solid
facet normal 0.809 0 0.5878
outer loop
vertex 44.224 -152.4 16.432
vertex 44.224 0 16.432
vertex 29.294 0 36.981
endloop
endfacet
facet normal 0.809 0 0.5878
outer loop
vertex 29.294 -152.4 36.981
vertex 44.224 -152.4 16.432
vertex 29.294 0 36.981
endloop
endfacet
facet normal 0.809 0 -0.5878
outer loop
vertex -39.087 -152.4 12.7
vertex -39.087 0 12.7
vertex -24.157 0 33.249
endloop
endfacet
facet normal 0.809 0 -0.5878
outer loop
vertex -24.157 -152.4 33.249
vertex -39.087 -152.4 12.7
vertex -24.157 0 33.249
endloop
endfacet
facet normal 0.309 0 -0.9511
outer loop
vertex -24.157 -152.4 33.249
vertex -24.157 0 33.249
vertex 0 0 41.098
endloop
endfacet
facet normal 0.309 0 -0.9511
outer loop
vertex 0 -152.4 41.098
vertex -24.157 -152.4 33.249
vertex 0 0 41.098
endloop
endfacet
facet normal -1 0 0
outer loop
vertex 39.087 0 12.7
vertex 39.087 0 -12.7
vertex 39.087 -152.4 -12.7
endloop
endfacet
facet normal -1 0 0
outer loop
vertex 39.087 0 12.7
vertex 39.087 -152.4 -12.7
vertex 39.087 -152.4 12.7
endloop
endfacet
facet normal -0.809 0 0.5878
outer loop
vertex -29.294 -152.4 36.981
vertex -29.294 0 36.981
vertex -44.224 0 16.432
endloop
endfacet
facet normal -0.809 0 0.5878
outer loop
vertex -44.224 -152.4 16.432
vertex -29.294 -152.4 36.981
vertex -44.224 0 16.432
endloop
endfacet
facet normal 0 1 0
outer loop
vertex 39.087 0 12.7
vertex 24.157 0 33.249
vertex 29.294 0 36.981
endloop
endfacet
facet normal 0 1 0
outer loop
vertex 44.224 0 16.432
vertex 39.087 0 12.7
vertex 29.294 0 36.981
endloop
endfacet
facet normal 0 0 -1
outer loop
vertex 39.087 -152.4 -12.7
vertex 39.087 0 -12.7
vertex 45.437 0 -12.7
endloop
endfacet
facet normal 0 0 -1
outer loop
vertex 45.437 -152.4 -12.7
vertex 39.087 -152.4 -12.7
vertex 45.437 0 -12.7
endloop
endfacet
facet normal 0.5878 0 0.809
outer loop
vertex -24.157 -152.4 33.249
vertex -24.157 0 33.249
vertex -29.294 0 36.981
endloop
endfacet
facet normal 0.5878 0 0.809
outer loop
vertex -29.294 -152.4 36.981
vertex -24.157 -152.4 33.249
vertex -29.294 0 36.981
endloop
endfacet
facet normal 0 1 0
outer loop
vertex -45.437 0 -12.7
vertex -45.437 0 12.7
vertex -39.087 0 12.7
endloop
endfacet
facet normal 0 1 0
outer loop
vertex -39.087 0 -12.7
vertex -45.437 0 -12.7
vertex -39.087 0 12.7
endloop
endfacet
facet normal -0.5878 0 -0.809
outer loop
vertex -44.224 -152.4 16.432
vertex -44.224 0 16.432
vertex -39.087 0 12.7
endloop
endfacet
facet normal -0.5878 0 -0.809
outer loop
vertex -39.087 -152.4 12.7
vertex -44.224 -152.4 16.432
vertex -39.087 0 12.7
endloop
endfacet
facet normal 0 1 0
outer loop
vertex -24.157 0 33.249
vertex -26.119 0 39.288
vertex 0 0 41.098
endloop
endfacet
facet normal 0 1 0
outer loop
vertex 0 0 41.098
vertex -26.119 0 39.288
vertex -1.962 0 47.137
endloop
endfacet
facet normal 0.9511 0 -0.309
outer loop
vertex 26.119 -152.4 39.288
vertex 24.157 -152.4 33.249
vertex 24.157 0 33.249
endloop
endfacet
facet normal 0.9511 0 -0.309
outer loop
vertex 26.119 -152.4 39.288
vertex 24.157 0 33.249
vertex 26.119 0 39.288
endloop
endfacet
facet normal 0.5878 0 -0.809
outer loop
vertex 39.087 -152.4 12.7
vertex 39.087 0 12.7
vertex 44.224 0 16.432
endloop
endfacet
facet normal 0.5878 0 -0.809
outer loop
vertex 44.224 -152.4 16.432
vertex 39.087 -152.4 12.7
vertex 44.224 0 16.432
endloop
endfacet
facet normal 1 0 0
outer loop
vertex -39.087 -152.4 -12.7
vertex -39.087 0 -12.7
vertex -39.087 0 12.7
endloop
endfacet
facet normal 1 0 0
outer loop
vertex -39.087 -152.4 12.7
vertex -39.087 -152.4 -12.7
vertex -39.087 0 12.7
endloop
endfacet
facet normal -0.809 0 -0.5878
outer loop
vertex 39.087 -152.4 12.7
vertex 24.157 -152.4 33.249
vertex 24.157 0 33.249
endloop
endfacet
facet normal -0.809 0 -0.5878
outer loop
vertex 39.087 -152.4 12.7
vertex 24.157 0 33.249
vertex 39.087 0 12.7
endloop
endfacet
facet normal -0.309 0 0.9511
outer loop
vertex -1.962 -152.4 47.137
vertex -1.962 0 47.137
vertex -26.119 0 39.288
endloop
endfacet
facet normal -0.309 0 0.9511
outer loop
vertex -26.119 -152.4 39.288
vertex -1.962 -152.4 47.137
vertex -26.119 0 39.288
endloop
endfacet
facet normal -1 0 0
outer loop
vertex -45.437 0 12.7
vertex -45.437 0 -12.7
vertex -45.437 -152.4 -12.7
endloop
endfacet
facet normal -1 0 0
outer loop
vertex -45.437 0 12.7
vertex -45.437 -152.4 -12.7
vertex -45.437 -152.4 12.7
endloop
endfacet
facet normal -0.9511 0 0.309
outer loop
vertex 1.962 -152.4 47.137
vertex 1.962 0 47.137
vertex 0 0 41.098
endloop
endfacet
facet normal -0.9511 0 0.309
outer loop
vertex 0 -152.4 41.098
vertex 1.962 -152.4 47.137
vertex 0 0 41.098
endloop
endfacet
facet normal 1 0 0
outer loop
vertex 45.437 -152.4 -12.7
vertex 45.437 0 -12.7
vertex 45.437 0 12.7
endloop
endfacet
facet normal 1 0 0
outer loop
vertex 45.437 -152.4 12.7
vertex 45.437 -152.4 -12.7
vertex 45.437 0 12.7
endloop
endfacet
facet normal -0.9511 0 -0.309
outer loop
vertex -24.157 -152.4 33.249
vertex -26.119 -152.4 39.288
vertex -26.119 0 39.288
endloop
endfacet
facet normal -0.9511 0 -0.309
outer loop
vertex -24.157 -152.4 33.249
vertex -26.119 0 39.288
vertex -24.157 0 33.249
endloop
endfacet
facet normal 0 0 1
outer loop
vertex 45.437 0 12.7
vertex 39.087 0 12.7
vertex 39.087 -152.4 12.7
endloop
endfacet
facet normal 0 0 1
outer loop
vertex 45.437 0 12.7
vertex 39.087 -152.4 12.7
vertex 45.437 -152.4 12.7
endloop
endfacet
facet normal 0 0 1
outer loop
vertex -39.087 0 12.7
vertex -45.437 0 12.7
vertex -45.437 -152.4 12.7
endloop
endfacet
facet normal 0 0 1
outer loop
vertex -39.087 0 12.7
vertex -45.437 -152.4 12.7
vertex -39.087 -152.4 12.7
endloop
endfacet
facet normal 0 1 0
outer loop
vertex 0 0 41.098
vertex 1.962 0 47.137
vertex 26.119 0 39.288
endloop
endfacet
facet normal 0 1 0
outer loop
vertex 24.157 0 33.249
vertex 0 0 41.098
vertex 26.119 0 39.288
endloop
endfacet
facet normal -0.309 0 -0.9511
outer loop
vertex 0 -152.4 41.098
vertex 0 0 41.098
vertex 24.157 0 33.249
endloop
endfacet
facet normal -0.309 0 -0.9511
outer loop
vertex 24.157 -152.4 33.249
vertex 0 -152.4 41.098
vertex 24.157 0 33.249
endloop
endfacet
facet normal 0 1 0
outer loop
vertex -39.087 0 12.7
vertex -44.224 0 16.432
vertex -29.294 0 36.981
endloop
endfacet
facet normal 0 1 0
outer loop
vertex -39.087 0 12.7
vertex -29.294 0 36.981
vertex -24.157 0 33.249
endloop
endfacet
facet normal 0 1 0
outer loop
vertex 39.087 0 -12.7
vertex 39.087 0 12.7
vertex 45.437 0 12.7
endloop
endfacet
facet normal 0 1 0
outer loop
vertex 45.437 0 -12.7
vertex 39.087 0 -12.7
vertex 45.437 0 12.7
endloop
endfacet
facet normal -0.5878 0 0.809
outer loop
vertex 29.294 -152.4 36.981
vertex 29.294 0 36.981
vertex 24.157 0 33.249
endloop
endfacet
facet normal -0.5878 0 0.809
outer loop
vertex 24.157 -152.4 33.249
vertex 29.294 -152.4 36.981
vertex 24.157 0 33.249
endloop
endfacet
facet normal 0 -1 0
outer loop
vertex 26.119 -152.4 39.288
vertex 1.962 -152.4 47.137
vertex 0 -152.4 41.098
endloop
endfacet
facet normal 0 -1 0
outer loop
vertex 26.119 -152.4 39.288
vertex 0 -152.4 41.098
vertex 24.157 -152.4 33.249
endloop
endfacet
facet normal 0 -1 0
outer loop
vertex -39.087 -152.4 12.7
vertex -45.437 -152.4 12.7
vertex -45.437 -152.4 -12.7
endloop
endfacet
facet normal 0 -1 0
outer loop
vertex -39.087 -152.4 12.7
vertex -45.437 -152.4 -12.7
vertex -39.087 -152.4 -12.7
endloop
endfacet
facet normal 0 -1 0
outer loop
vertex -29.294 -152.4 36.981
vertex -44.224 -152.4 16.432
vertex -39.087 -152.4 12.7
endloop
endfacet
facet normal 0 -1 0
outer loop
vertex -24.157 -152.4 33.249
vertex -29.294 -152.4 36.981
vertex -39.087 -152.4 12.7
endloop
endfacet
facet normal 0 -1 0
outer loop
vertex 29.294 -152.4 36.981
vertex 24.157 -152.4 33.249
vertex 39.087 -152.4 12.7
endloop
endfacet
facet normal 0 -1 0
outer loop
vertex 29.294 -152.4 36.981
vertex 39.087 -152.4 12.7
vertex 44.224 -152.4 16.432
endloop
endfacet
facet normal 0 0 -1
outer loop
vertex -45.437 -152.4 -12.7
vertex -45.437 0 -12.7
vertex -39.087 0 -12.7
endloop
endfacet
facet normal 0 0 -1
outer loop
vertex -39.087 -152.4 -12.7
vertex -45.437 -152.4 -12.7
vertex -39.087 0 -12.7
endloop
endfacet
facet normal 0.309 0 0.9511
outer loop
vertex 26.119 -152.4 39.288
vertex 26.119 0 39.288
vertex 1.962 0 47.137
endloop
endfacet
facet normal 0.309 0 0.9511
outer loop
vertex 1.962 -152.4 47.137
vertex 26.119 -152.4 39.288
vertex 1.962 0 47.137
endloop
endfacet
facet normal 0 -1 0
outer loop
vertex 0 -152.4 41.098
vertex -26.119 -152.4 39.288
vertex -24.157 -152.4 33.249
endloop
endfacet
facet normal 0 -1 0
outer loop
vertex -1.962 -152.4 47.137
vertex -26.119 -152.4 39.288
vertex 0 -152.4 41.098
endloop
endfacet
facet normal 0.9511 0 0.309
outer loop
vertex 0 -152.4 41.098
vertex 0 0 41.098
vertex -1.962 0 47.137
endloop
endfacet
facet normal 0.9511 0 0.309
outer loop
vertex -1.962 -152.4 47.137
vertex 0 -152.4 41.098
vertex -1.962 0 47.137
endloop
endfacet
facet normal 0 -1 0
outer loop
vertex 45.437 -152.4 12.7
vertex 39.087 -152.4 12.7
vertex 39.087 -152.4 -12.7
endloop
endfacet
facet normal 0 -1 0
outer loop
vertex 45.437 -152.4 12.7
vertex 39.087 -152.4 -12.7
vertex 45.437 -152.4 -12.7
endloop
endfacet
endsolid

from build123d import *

# Parameters (mm, degrees)
F0_W     = 6.35
F0_H     = 25.4
F1_DEPTH = 152.4


with BuildPart() as f1:
    # F0 (on Front) → F1 (new body)
    with BuildSketch(Plane.XZ):
        with Locations((-42.261581, 0)):
            Rectangle(F0_W, F0_H)
        Polygon((-44.223839, 16.432436), (-39.086581, 12.7), (-24.156836, 33.249032), (-29.294093, 36.981468), align=None)
        Polygon((-26.119093, 39.288241), (-24.156836, 33.249032), (0, 41.098063), (-1.962258, 47.137272), align=None)
        Polygon((1.962258, 47.137272), (0, 41.098063), (24.156836, 33.249032), (26.119093, 39.288241), align=None)
        Polygon((24.156836, 33.249032), (39.086581, 12.7), (44.223839, 16.432436), (29.294093, 36.981468), align=None)
        with Locations((42.261581, 0)):
            Rectangle(F0_W, F0_H)
    extrude(amount=F1_DEPTH)


solid = f1.part
